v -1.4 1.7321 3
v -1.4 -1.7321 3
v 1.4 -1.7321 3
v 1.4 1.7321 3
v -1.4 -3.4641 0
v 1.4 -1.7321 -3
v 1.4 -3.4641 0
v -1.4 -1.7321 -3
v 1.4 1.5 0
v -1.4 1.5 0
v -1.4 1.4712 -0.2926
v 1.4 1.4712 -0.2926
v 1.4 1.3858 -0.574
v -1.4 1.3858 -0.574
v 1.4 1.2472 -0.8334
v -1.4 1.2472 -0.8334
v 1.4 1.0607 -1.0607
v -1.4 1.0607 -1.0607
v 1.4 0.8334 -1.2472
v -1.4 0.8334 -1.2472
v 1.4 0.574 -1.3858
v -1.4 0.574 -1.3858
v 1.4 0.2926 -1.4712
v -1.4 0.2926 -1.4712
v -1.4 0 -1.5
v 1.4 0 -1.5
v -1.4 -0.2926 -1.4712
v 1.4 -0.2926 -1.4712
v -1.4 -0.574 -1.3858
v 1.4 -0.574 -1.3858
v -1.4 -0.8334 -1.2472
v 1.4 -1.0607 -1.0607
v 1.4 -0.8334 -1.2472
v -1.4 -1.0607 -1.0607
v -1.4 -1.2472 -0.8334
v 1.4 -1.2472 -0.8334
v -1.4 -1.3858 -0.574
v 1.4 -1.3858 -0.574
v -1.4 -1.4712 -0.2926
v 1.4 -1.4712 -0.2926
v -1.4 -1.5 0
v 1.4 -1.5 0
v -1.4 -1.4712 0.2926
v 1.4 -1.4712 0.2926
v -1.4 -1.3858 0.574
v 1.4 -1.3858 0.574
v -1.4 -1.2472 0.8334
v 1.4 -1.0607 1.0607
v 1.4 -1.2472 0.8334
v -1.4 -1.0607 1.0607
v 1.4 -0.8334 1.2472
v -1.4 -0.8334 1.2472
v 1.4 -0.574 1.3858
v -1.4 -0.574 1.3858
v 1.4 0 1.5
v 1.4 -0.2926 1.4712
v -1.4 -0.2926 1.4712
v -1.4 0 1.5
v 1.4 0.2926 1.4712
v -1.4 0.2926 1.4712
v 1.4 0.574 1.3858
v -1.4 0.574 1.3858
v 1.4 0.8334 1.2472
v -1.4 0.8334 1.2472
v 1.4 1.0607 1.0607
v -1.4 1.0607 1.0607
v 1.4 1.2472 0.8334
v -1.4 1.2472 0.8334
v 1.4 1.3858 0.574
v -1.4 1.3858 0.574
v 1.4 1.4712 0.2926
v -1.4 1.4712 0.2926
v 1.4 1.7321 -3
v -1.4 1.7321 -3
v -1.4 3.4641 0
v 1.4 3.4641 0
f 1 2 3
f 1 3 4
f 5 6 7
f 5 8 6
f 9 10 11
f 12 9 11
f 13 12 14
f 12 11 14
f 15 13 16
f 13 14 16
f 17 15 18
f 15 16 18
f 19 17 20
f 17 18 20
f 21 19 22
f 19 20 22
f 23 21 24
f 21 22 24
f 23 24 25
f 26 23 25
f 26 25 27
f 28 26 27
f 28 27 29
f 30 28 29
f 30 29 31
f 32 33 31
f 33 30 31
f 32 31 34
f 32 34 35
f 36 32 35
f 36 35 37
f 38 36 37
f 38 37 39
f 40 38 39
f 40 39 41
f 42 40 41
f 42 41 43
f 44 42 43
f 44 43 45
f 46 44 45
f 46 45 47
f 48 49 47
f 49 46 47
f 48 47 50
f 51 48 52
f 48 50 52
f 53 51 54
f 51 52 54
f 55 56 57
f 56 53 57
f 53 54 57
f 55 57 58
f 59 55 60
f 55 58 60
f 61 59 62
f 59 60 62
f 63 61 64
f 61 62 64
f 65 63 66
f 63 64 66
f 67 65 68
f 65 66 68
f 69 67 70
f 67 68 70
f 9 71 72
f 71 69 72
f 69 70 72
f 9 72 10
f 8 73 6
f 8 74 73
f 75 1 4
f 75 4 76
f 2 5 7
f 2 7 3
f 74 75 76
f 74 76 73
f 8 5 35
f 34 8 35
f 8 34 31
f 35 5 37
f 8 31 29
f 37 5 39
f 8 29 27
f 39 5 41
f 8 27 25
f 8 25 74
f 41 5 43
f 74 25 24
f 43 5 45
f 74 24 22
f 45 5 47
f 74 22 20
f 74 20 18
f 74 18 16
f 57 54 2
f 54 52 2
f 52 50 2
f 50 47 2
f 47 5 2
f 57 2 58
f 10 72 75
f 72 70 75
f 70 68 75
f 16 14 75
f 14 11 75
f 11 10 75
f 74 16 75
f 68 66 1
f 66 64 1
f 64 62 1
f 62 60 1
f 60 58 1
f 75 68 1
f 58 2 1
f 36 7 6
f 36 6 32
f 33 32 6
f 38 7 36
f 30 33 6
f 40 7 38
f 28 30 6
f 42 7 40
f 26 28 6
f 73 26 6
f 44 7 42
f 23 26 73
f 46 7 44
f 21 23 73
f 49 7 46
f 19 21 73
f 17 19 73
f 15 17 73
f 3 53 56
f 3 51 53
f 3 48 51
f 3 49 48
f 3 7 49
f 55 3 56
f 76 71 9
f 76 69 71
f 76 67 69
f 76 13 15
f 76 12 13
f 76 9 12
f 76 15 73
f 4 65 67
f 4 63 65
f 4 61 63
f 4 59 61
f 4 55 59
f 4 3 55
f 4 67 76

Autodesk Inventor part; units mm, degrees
ref_plane "YZ Plane" through (0, 0, 0) normal (1, 0, 0) x (0, 1, 0)
ref_plane "XZ Plane" through (0, 0, 0) normal (0, 1, 0) x (-1, 0, 0)
ref_plane "XY Plane" through (0, 0, 0) normal (0, 0, 1) x (1, 0, 0)
sketch "Sketch1" plane through (0, 0, 0) normal (1, 0, 0) x (0, 1, 0)
  line L0 (3.4641, 0) -> (1.7321, -3)
  line L1 (1.7321, -3) -> (-1.7321, -3)
  line L2 (-1.7321, -3) -> (-3.4641, 0)
  line L3 (-3.4641, 0) -> (-1.7321, 3)
  line L4 (-1.7321, 3) -> (1.7321, 3)
  line L5 (1.7321, 3) -> (3.4641, 0)
  circle A0 centre (0, 0) radius 1.5
  dimension "d1" = 6
  dimension "d2" = 3
extrude "Extrusion1" add sketch "Sketch1" along normal mid plane 2.8
thread "Thread1" size "M3x0.5" class "6H" standard "ANSI Metric M Profile" full length
properties part number "Porca do Escudo"
